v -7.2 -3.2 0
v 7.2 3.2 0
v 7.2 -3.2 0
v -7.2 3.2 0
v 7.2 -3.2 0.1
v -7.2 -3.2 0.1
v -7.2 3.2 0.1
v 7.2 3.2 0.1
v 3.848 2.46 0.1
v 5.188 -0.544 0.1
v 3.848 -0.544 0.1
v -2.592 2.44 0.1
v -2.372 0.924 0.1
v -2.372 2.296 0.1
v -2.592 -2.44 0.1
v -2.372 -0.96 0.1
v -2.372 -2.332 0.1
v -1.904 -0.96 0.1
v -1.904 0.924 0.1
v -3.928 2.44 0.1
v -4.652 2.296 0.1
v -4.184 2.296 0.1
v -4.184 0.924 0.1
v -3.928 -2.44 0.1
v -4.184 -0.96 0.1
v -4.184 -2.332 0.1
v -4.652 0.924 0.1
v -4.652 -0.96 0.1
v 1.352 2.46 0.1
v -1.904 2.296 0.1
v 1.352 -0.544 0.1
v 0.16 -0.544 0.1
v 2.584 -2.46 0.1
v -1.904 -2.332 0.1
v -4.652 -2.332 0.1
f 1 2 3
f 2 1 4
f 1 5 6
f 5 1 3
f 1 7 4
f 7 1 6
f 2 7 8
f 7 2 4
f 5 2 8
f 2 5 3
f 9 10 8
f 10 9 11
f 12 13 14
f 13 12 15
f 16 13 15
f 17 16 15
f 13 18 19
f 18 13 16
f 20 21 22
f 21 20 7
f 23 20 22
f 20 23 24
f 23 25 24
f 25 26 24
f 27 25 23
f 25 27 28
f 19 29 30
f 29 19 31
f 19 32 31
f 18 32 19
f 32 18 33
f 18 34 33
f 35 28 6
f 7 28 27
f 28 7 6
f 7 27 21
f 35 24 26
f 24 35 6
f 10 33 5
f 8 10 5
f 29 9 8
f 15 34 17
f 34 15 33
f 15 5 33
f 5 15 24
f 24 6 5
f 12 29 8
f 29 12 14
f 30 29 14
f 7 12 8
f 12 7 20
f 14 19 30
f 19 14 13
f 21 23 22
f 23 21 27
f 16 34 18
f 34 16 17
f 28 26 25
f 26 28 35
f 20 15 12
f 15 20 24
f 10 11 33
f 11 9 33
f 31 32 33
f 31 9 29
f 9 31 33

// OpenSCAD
// file: ../p/box5-12.scad
use <../lib.scad>
function ldraw_lib__box5_12() = [
// 0 Box with 5 Faces without Any Edges
// 0 Name: box5-12.dat
// 0 Author: Chris Dee [cwdee]
// 0 !LDRAW_ORG Primitive UPDATE 2009-02
// 0 !LICENSE Licensed under CC BY 4.0 : see CAreadme.txt
// 
// 0 BFC CERTIFY CCW
  [0,"BFC","CERTIFY"],
  [0,"BFC","CCW"],
// 
// 0 !HISTORY 2009-09-03 [PTadmin] Official Update 2009-02
// 
// 
// 4 16 1 1 1 1 1 -1 -1 1 -1 -1 1 1
  [4,16,1,1,1,1,1,-1,-1,1,-1,-1,1,1],
// 4 16 -1 0 1 1 0 1 1 1 1 -1 1 1
  [4,16,-1,0,1,1,0,1,1,1,1,-1,1,1],
// 4 16 -1 0 -1 -1 0 1 -1 1 1 -1 1 -1
  [4,16,-1,0,-1,-1,0,1,-1,1,1,-1,1,-1],
// 4 16 1 0 -1 -1 0 -1 -1 1 -1 1 1 -1
  [4,16,1,0,-1,-1,0,-1,-1,1,-1,1,1,-1],
// 4 16 1 0 1 1 0 -1 1 1 -1 1 1 1
  [4,16,1,0,1,1,0,-1,1,1,-1,1,1,1],
// 0
];
module ldraw_lib__box5_12(step=0, col=false, unit=2/5, alt=false, line=0.2, solid=!$preview)
    makepoly(ldraw_lib__box5_12(), step=step, col=col, unit=unit, alt=alt, line=line, solid=solid);
ldraw_lib__box5_12(line=0.2);
// file: 821577e.scad
use <../lib.scad>
use <../p/box5-12.scad>
function ldraw_lib__821577e() = [
// 0 Sticker  0.8 x  1.8 with Car and Red Straight Arrow Up
// 0 Name: 821577e.dat
// 0 Author: Evert-Jan Boer [ejboer]
// 0 !LDRAW_ORG Part UPDATE 2026-07
// 0 !LICENSE Licensed under CC BY 4.0 : see CAreadme.txt
// 
// 0 BFC CERTIFY CCW
  [0,"BFC","CERTIFY"],
  [0,"BFC","CCW"],
// 
// 0 !CATEGORY Sticker
// 0 !KEYWORDS Multi Control, Set 8082
// 
// 0 !HISTORY 2026-07-30 [OrionP] Official Update 2026-07
// 
// 1 16 0 -.25 0 18 0 0 0 0.25 0 0 0 8 box5-12.dat
  [1,16,0,-.25,0,18,0,0,0,0.25,0,0,0,8, ldraw_lib__box5_12()],
// 4 16 12.97 -.25 1.36 9.62 -.25 1.36 9.62 -.25 -6.15 18 -.25 -8
  [4,16,12.97,-.25,1.36,9.62,-.25,1.36,9.62,-.25,-6.15,18,-.25,-8],
// 4 16 -5.93 -.25 -5.74 -5.93 -.25 -2.31 -6.48 -.25 6.1 -6.48 -.25 -6.1
  [4,16,-5.93,-.25,-5.74,-5.93,-.25,-2.31,-6.48,-.25,6.1,-6.48,-.25,-6.1],
// 3 16 -6.48 -.25 6.1 -5.93 -.25 -2.31 -5.93 -.25 2.4
  [3,16,-6.48,-.25,6.1,-5.93,-.25,-2.31,-5.93,-.25,2.4],
// 3 16 -6.48 -.25 6.1 -5.93 -.25 2.4 -5.93 -.25 5.83
  [3,16,-6.48,-.25,6.1,-5.93,-.25,2.4,-5.93,-.25,5.83],
// 4 16 -5.93 -.25 -2.31 -4.76 -.25 -2.31 -4.76 -.25 2.4 -5.93 -.25 2.4
  [4,16,-5.93,-.25,-2.31,-4.76,-.25,-2.31,-4.76,-.25,2.4,-5.93,-.25,2.4],
// 4 16 -9.82 -.25 -6.1 -10.46 -.25 -5.74 -11.63 -.25 -5.74 -18 -.25 -8
  [4,16,-9.82,-.25,-6.1,-10.46,-.25,-5.74,-11.63,-.25,-5.74,-18,-.25,-8],
// 4 16 -10.46 -.25 -5.74 -9.82 -.25 -6.1 -9.82 -.25 6.1 -10.46 -.25 -2.31
  [4,16,-10.46,-.25,-5.74,-9.82,-.25,-6.1,-9.82,-.25,6.1,-10.46,-.25,-2.31],
// 3 16 -9.82 -.25 6.1 -10.46 -.25 2.4 -10.46 -.25 -2.31
  [3,16,-9.82,-.25,6.1,-10.46,-.25,2.4,-10.46,-.25,-2.31],
// 3 16 -9.82 -.25 6.1 -10.46 -.25 5.83 -10.46 -.25 2.4
  [3,16,-9.82,-.25,6.1,-10.46,-.25,5.83,-10.46,-.25,2.4],
// 4 16 -10.46 -.25 2.4 -11.63 -.25 2.4 -11.63 -.25 -2.31 -10.46 -.25 -2.31
  [4,16,-10.46,-.25,2.4,-11.63,-.25,2.4,-11.63,-.25,-2.31,-10.46,-.25,-2.31],
// 4 16 3.38 -.25 -6.15 3.38 -.25 1.36 -4.76 -.25 -2.31 -4.76 -.25 -5.74
  [4,16,3.38,-.25,-6.15,3.38,-.25,1.36,-4.76,-.25,-2.31,-4.76,-.25,-5.74],
// 3 16 3.38 -.25 1.36 .4 -.25 1.36 -4.76 -.25 -2.31
  [3,16,3.38,-.25,1.36,.4,-.25,1.36,-4.76,-.25,-2.31],
// 4 16 -4.76 -.25 -2.31 .4 -.25 1.36 6.46 -.25 6.15 -4.76 -.25 2.4
  [4,16,-4.76,-.25,-2.31,.4,-.25,1.36,6.46,-.25,6.15,-4.76,-.25,2.4],
// 3 16 6.46 -.25 6.15 -4.76 -.25 5.83 -4.76 -.25 2.4
  [3,16,6.46,-.25,6.15,-4.76,-.25,5.83,-4.76,-.25,2.4],
// 3 16 -18 -.25 8 -11.63 -.25 2.4 -11.63 -.25 5.83
  [3,16,-18,-.25,8,-11.63,-.25,2.4,-11.63,-.25,5.83],
// 4 16 -11.63 -.25 -2.31 -11.63 -.25 2.4 -18 -.25 8 -18 -.25 -8
  [4,16,-11.63,-.25,-2.31,-11.63,-.25,2.4,-18,-.25,8,-18,-.25,-8],
// 3 16 -11.63 -.25 -5.74 -11.63 -.25 -2.31 -18 -.25 -8
  [3,16,-11.63,-.25,-5.74,-11.63,-.25,-2.31,-18,-.25,-8],
// 4 16 -10.46 -.25 5.83 -9.82 -.25 6.1 -18 -.25 8 -11.63 -.25 5.83
  [4,16,-10.46,-.25,5.83,-9.82,-.25,6.1,-18,-.25,8,-11.63,-.25,5.83],
// 3 16 18 -.25 8 6.46 -.25 6.15 12.97 -.25 1.36
  [3,16,18,-.25,8,6.46,-.25,6.15,12.97,-.25,1.36],
// 3 16 18 -.25 8 12.97 -.25 1.36 18 -.25 -8
  [3,16,18,-.25,8,12.97,-.25,1.36,18,-.25,-8],
// 3 16 18 -.25 -8 9.62 -.25 -6.15 3.38 -.25 -6.15
  [3,16,18,-.25,-8,9.62,-.25,-6.15,3.38,-.25,-6.15],
// 4 16 -6.48 -.25 6.1 -5.93 -.25 5.83 -4.76 -.25 5.83 6.46 -.25 6.15
  [4,16,-6.48,-.25,6.1,-5.93,-.25,5.83,-4.76,-.25,5.83,6.46,-.25,6.15],
// 4 16 -9.82 -.25 6.1 -6.48 -.25 6.1 6.46 -.25 6.15 18 -.25 8
  [4,16,-9.82,-.25,6.1,-6.48,-.25,6.1,6.46,-.25,6.15,18,-.25,8],
// 3 16 18 -.25 8 -18 -.25 8 -9.82 -.25 6.1
  [3,16,18,-.25,8,-18,-.25,8,-9.82,-.25,6.1],
// 4 16 18 -.25 -8 3.38 -.25 -6.15 -5.93 -.25 -5.74 -6.48 -.25 -6.1
  [4,16,18,-.25,-8,3.38,-.25,-6.15,-5.93,-.25,-5.74,-6.48,-.25,-6.1],
// 3 16 -5.93 -.25 -5.74 3.38 -.25 -6.15 -4.76 -.25 -5.74
  [3,16,-5.93,-.25,-5.74,3.38,-.25,-6.15,-4.76,-.25,-5.74],
// 4 16 -18 -.25 -8 18 -.25 -8 -6.48 -.25 -6.1 -9.82 -.25 -6.1
  [4,16,-18,-.25,-8,18,-.25,-8,-6.48,-.25,-6.1,-9.82,-.25,-6.1],
// 
// 0 BFC NOCLIP
  [0,"BFC","NOCLIP"],
// 
// 4 14 -5.93 -.25 -2.31 -5.93 -.25 -5.74 -4.76 -.25 -5.74 -4.76 -.25 -2.31
  [4,14,-5.93,-.25,-2.31,-5.93,-.25,-5.74,-4.76,-.25,-5.74,-4.76,-.25,-2.31],
// 4 14 -11.63 -.25 -2.31 -11.63 -.25 -5.74 -10.46 -.25 -5.74 -10.46 -.25 -2.31
  [4,14,-11.63,-.25,-2.31,-11.63,-.25,-5.74,-10.46,-.25,-5.74,-10.46,-.25,-2.31],
// 4 14 -5.93 -.25 5.83 -5.93 -.25 2.4 -4.76 -.25 2.4 -4.76 -.25 5.83
  [4,14,-5.93,-.25,5.83,-5.93,-.25,2.4,-4.76,-.25,2.4,-4.76,-.25,5.83],
// 4 14 -11.63 -.25 5.83 -11.63 -.25 2.4 -10.46 -.25 2.4 -10.46 -.25 5.83
  [4,14,-11.63,-.25,5.83,-11.63,-.25,2.4,-10.46,-.25,2.4,-10.46,-.25,5.83],
// 4 0 -9.82 -.25 6.1 -9.82 -.25 -6.1 -6.48 -.25 -6.1 -6.48 -.25 6.1
  [4,0,-9.82,-.25,6.1,-9.82,-.25,-6.1,-6.48,-.25,-6.1,-6.48,-.25,6.1],
// 3 4 6.46 -.25 6.15 9.62 -.25 1.36 12.97 -.25 1.36
  [3,4,6.46,-.25,6.15,9.62,-.25,1.36,12.97,-.25,1.36],
// 3 4 6.46 -.25 6.15 9.62 -.25 -6.15 9.62 -.25 1.36
  [3,4,6.46,-.25,6.15,9.62,-.25,-6.15,9.62,-.25,1.36],
// 3 4 6.46 -.25 6.15 .4 -.25 1.36 3.38 -.25 1.36
  [3,4,6.46,-.25,6.15,.4,-.25,1.36,3.38,-.25,1.36],
// 4 4 6.46 -.25 6.15 3.38 -.25 1.36 3.38 -.25 -6.15 9.62 -.25 -6.15
  [4,4,6.46,-.25,6.15,3.38,-.25,1.36,3.38,-.25,-6.15,9.62,-.25,-6.15],
];
module ldraw_lib__821577e(step=0, col=false, unit=2/5, alt=false, line=0.2, solid=!$preview)
    makepoly(ldraw_lib__821577e(), step=step, col=col, unit=unit, alt=alt, line=line, solid=solid);
ldraw_lib__821577e(line=0.2);
// main file
use <../lib.scad>
use <821577e.scad>
function ldraw_lib__821577f() = [
// 0 Sticker  0.8 x  1.8 with Car and Red Straight Arrow Down
// 0 Name: 821577f.dat
// 0 Author: Evert-Jan Boer [ejboer]
// 0 !LDRAW_ORG Part UPDATE 2026-07
// 0 !LICENSE Licensed under CC BY 4.0 : see CAreadme.txt
// 
// 0 BFC CERTIFY CCW
  [0,"BFC","CERTIFY"],
  [0,"BFC","CCW"],
// 
// 0 !CATEGORY Sticker
// 0 !KEYWORDS Multi Control, Set 8082
// 
// 0 !HISTORY 2026-07-30 [OrionP] Official Update 2026-07
// 
// 1 16 0 0 0 1 0 0 0 1 0 0 0 -1 821577e.dat
  [1,16,0,0,0,1,0,0,0,1,0,0,0,-1, ldraw_lib__821577e()],
];
module ldraw_lib__821577f(step=0, col=false, unit=2/5, alt=false, line=0.2, solid=!$preview)
    makepoly(ldraw_lib__821577f(), step=step, col=col, unit=unit, alt=alt, line=line, solid=solid);
ldraw_lib__821577f(line=0.2);
